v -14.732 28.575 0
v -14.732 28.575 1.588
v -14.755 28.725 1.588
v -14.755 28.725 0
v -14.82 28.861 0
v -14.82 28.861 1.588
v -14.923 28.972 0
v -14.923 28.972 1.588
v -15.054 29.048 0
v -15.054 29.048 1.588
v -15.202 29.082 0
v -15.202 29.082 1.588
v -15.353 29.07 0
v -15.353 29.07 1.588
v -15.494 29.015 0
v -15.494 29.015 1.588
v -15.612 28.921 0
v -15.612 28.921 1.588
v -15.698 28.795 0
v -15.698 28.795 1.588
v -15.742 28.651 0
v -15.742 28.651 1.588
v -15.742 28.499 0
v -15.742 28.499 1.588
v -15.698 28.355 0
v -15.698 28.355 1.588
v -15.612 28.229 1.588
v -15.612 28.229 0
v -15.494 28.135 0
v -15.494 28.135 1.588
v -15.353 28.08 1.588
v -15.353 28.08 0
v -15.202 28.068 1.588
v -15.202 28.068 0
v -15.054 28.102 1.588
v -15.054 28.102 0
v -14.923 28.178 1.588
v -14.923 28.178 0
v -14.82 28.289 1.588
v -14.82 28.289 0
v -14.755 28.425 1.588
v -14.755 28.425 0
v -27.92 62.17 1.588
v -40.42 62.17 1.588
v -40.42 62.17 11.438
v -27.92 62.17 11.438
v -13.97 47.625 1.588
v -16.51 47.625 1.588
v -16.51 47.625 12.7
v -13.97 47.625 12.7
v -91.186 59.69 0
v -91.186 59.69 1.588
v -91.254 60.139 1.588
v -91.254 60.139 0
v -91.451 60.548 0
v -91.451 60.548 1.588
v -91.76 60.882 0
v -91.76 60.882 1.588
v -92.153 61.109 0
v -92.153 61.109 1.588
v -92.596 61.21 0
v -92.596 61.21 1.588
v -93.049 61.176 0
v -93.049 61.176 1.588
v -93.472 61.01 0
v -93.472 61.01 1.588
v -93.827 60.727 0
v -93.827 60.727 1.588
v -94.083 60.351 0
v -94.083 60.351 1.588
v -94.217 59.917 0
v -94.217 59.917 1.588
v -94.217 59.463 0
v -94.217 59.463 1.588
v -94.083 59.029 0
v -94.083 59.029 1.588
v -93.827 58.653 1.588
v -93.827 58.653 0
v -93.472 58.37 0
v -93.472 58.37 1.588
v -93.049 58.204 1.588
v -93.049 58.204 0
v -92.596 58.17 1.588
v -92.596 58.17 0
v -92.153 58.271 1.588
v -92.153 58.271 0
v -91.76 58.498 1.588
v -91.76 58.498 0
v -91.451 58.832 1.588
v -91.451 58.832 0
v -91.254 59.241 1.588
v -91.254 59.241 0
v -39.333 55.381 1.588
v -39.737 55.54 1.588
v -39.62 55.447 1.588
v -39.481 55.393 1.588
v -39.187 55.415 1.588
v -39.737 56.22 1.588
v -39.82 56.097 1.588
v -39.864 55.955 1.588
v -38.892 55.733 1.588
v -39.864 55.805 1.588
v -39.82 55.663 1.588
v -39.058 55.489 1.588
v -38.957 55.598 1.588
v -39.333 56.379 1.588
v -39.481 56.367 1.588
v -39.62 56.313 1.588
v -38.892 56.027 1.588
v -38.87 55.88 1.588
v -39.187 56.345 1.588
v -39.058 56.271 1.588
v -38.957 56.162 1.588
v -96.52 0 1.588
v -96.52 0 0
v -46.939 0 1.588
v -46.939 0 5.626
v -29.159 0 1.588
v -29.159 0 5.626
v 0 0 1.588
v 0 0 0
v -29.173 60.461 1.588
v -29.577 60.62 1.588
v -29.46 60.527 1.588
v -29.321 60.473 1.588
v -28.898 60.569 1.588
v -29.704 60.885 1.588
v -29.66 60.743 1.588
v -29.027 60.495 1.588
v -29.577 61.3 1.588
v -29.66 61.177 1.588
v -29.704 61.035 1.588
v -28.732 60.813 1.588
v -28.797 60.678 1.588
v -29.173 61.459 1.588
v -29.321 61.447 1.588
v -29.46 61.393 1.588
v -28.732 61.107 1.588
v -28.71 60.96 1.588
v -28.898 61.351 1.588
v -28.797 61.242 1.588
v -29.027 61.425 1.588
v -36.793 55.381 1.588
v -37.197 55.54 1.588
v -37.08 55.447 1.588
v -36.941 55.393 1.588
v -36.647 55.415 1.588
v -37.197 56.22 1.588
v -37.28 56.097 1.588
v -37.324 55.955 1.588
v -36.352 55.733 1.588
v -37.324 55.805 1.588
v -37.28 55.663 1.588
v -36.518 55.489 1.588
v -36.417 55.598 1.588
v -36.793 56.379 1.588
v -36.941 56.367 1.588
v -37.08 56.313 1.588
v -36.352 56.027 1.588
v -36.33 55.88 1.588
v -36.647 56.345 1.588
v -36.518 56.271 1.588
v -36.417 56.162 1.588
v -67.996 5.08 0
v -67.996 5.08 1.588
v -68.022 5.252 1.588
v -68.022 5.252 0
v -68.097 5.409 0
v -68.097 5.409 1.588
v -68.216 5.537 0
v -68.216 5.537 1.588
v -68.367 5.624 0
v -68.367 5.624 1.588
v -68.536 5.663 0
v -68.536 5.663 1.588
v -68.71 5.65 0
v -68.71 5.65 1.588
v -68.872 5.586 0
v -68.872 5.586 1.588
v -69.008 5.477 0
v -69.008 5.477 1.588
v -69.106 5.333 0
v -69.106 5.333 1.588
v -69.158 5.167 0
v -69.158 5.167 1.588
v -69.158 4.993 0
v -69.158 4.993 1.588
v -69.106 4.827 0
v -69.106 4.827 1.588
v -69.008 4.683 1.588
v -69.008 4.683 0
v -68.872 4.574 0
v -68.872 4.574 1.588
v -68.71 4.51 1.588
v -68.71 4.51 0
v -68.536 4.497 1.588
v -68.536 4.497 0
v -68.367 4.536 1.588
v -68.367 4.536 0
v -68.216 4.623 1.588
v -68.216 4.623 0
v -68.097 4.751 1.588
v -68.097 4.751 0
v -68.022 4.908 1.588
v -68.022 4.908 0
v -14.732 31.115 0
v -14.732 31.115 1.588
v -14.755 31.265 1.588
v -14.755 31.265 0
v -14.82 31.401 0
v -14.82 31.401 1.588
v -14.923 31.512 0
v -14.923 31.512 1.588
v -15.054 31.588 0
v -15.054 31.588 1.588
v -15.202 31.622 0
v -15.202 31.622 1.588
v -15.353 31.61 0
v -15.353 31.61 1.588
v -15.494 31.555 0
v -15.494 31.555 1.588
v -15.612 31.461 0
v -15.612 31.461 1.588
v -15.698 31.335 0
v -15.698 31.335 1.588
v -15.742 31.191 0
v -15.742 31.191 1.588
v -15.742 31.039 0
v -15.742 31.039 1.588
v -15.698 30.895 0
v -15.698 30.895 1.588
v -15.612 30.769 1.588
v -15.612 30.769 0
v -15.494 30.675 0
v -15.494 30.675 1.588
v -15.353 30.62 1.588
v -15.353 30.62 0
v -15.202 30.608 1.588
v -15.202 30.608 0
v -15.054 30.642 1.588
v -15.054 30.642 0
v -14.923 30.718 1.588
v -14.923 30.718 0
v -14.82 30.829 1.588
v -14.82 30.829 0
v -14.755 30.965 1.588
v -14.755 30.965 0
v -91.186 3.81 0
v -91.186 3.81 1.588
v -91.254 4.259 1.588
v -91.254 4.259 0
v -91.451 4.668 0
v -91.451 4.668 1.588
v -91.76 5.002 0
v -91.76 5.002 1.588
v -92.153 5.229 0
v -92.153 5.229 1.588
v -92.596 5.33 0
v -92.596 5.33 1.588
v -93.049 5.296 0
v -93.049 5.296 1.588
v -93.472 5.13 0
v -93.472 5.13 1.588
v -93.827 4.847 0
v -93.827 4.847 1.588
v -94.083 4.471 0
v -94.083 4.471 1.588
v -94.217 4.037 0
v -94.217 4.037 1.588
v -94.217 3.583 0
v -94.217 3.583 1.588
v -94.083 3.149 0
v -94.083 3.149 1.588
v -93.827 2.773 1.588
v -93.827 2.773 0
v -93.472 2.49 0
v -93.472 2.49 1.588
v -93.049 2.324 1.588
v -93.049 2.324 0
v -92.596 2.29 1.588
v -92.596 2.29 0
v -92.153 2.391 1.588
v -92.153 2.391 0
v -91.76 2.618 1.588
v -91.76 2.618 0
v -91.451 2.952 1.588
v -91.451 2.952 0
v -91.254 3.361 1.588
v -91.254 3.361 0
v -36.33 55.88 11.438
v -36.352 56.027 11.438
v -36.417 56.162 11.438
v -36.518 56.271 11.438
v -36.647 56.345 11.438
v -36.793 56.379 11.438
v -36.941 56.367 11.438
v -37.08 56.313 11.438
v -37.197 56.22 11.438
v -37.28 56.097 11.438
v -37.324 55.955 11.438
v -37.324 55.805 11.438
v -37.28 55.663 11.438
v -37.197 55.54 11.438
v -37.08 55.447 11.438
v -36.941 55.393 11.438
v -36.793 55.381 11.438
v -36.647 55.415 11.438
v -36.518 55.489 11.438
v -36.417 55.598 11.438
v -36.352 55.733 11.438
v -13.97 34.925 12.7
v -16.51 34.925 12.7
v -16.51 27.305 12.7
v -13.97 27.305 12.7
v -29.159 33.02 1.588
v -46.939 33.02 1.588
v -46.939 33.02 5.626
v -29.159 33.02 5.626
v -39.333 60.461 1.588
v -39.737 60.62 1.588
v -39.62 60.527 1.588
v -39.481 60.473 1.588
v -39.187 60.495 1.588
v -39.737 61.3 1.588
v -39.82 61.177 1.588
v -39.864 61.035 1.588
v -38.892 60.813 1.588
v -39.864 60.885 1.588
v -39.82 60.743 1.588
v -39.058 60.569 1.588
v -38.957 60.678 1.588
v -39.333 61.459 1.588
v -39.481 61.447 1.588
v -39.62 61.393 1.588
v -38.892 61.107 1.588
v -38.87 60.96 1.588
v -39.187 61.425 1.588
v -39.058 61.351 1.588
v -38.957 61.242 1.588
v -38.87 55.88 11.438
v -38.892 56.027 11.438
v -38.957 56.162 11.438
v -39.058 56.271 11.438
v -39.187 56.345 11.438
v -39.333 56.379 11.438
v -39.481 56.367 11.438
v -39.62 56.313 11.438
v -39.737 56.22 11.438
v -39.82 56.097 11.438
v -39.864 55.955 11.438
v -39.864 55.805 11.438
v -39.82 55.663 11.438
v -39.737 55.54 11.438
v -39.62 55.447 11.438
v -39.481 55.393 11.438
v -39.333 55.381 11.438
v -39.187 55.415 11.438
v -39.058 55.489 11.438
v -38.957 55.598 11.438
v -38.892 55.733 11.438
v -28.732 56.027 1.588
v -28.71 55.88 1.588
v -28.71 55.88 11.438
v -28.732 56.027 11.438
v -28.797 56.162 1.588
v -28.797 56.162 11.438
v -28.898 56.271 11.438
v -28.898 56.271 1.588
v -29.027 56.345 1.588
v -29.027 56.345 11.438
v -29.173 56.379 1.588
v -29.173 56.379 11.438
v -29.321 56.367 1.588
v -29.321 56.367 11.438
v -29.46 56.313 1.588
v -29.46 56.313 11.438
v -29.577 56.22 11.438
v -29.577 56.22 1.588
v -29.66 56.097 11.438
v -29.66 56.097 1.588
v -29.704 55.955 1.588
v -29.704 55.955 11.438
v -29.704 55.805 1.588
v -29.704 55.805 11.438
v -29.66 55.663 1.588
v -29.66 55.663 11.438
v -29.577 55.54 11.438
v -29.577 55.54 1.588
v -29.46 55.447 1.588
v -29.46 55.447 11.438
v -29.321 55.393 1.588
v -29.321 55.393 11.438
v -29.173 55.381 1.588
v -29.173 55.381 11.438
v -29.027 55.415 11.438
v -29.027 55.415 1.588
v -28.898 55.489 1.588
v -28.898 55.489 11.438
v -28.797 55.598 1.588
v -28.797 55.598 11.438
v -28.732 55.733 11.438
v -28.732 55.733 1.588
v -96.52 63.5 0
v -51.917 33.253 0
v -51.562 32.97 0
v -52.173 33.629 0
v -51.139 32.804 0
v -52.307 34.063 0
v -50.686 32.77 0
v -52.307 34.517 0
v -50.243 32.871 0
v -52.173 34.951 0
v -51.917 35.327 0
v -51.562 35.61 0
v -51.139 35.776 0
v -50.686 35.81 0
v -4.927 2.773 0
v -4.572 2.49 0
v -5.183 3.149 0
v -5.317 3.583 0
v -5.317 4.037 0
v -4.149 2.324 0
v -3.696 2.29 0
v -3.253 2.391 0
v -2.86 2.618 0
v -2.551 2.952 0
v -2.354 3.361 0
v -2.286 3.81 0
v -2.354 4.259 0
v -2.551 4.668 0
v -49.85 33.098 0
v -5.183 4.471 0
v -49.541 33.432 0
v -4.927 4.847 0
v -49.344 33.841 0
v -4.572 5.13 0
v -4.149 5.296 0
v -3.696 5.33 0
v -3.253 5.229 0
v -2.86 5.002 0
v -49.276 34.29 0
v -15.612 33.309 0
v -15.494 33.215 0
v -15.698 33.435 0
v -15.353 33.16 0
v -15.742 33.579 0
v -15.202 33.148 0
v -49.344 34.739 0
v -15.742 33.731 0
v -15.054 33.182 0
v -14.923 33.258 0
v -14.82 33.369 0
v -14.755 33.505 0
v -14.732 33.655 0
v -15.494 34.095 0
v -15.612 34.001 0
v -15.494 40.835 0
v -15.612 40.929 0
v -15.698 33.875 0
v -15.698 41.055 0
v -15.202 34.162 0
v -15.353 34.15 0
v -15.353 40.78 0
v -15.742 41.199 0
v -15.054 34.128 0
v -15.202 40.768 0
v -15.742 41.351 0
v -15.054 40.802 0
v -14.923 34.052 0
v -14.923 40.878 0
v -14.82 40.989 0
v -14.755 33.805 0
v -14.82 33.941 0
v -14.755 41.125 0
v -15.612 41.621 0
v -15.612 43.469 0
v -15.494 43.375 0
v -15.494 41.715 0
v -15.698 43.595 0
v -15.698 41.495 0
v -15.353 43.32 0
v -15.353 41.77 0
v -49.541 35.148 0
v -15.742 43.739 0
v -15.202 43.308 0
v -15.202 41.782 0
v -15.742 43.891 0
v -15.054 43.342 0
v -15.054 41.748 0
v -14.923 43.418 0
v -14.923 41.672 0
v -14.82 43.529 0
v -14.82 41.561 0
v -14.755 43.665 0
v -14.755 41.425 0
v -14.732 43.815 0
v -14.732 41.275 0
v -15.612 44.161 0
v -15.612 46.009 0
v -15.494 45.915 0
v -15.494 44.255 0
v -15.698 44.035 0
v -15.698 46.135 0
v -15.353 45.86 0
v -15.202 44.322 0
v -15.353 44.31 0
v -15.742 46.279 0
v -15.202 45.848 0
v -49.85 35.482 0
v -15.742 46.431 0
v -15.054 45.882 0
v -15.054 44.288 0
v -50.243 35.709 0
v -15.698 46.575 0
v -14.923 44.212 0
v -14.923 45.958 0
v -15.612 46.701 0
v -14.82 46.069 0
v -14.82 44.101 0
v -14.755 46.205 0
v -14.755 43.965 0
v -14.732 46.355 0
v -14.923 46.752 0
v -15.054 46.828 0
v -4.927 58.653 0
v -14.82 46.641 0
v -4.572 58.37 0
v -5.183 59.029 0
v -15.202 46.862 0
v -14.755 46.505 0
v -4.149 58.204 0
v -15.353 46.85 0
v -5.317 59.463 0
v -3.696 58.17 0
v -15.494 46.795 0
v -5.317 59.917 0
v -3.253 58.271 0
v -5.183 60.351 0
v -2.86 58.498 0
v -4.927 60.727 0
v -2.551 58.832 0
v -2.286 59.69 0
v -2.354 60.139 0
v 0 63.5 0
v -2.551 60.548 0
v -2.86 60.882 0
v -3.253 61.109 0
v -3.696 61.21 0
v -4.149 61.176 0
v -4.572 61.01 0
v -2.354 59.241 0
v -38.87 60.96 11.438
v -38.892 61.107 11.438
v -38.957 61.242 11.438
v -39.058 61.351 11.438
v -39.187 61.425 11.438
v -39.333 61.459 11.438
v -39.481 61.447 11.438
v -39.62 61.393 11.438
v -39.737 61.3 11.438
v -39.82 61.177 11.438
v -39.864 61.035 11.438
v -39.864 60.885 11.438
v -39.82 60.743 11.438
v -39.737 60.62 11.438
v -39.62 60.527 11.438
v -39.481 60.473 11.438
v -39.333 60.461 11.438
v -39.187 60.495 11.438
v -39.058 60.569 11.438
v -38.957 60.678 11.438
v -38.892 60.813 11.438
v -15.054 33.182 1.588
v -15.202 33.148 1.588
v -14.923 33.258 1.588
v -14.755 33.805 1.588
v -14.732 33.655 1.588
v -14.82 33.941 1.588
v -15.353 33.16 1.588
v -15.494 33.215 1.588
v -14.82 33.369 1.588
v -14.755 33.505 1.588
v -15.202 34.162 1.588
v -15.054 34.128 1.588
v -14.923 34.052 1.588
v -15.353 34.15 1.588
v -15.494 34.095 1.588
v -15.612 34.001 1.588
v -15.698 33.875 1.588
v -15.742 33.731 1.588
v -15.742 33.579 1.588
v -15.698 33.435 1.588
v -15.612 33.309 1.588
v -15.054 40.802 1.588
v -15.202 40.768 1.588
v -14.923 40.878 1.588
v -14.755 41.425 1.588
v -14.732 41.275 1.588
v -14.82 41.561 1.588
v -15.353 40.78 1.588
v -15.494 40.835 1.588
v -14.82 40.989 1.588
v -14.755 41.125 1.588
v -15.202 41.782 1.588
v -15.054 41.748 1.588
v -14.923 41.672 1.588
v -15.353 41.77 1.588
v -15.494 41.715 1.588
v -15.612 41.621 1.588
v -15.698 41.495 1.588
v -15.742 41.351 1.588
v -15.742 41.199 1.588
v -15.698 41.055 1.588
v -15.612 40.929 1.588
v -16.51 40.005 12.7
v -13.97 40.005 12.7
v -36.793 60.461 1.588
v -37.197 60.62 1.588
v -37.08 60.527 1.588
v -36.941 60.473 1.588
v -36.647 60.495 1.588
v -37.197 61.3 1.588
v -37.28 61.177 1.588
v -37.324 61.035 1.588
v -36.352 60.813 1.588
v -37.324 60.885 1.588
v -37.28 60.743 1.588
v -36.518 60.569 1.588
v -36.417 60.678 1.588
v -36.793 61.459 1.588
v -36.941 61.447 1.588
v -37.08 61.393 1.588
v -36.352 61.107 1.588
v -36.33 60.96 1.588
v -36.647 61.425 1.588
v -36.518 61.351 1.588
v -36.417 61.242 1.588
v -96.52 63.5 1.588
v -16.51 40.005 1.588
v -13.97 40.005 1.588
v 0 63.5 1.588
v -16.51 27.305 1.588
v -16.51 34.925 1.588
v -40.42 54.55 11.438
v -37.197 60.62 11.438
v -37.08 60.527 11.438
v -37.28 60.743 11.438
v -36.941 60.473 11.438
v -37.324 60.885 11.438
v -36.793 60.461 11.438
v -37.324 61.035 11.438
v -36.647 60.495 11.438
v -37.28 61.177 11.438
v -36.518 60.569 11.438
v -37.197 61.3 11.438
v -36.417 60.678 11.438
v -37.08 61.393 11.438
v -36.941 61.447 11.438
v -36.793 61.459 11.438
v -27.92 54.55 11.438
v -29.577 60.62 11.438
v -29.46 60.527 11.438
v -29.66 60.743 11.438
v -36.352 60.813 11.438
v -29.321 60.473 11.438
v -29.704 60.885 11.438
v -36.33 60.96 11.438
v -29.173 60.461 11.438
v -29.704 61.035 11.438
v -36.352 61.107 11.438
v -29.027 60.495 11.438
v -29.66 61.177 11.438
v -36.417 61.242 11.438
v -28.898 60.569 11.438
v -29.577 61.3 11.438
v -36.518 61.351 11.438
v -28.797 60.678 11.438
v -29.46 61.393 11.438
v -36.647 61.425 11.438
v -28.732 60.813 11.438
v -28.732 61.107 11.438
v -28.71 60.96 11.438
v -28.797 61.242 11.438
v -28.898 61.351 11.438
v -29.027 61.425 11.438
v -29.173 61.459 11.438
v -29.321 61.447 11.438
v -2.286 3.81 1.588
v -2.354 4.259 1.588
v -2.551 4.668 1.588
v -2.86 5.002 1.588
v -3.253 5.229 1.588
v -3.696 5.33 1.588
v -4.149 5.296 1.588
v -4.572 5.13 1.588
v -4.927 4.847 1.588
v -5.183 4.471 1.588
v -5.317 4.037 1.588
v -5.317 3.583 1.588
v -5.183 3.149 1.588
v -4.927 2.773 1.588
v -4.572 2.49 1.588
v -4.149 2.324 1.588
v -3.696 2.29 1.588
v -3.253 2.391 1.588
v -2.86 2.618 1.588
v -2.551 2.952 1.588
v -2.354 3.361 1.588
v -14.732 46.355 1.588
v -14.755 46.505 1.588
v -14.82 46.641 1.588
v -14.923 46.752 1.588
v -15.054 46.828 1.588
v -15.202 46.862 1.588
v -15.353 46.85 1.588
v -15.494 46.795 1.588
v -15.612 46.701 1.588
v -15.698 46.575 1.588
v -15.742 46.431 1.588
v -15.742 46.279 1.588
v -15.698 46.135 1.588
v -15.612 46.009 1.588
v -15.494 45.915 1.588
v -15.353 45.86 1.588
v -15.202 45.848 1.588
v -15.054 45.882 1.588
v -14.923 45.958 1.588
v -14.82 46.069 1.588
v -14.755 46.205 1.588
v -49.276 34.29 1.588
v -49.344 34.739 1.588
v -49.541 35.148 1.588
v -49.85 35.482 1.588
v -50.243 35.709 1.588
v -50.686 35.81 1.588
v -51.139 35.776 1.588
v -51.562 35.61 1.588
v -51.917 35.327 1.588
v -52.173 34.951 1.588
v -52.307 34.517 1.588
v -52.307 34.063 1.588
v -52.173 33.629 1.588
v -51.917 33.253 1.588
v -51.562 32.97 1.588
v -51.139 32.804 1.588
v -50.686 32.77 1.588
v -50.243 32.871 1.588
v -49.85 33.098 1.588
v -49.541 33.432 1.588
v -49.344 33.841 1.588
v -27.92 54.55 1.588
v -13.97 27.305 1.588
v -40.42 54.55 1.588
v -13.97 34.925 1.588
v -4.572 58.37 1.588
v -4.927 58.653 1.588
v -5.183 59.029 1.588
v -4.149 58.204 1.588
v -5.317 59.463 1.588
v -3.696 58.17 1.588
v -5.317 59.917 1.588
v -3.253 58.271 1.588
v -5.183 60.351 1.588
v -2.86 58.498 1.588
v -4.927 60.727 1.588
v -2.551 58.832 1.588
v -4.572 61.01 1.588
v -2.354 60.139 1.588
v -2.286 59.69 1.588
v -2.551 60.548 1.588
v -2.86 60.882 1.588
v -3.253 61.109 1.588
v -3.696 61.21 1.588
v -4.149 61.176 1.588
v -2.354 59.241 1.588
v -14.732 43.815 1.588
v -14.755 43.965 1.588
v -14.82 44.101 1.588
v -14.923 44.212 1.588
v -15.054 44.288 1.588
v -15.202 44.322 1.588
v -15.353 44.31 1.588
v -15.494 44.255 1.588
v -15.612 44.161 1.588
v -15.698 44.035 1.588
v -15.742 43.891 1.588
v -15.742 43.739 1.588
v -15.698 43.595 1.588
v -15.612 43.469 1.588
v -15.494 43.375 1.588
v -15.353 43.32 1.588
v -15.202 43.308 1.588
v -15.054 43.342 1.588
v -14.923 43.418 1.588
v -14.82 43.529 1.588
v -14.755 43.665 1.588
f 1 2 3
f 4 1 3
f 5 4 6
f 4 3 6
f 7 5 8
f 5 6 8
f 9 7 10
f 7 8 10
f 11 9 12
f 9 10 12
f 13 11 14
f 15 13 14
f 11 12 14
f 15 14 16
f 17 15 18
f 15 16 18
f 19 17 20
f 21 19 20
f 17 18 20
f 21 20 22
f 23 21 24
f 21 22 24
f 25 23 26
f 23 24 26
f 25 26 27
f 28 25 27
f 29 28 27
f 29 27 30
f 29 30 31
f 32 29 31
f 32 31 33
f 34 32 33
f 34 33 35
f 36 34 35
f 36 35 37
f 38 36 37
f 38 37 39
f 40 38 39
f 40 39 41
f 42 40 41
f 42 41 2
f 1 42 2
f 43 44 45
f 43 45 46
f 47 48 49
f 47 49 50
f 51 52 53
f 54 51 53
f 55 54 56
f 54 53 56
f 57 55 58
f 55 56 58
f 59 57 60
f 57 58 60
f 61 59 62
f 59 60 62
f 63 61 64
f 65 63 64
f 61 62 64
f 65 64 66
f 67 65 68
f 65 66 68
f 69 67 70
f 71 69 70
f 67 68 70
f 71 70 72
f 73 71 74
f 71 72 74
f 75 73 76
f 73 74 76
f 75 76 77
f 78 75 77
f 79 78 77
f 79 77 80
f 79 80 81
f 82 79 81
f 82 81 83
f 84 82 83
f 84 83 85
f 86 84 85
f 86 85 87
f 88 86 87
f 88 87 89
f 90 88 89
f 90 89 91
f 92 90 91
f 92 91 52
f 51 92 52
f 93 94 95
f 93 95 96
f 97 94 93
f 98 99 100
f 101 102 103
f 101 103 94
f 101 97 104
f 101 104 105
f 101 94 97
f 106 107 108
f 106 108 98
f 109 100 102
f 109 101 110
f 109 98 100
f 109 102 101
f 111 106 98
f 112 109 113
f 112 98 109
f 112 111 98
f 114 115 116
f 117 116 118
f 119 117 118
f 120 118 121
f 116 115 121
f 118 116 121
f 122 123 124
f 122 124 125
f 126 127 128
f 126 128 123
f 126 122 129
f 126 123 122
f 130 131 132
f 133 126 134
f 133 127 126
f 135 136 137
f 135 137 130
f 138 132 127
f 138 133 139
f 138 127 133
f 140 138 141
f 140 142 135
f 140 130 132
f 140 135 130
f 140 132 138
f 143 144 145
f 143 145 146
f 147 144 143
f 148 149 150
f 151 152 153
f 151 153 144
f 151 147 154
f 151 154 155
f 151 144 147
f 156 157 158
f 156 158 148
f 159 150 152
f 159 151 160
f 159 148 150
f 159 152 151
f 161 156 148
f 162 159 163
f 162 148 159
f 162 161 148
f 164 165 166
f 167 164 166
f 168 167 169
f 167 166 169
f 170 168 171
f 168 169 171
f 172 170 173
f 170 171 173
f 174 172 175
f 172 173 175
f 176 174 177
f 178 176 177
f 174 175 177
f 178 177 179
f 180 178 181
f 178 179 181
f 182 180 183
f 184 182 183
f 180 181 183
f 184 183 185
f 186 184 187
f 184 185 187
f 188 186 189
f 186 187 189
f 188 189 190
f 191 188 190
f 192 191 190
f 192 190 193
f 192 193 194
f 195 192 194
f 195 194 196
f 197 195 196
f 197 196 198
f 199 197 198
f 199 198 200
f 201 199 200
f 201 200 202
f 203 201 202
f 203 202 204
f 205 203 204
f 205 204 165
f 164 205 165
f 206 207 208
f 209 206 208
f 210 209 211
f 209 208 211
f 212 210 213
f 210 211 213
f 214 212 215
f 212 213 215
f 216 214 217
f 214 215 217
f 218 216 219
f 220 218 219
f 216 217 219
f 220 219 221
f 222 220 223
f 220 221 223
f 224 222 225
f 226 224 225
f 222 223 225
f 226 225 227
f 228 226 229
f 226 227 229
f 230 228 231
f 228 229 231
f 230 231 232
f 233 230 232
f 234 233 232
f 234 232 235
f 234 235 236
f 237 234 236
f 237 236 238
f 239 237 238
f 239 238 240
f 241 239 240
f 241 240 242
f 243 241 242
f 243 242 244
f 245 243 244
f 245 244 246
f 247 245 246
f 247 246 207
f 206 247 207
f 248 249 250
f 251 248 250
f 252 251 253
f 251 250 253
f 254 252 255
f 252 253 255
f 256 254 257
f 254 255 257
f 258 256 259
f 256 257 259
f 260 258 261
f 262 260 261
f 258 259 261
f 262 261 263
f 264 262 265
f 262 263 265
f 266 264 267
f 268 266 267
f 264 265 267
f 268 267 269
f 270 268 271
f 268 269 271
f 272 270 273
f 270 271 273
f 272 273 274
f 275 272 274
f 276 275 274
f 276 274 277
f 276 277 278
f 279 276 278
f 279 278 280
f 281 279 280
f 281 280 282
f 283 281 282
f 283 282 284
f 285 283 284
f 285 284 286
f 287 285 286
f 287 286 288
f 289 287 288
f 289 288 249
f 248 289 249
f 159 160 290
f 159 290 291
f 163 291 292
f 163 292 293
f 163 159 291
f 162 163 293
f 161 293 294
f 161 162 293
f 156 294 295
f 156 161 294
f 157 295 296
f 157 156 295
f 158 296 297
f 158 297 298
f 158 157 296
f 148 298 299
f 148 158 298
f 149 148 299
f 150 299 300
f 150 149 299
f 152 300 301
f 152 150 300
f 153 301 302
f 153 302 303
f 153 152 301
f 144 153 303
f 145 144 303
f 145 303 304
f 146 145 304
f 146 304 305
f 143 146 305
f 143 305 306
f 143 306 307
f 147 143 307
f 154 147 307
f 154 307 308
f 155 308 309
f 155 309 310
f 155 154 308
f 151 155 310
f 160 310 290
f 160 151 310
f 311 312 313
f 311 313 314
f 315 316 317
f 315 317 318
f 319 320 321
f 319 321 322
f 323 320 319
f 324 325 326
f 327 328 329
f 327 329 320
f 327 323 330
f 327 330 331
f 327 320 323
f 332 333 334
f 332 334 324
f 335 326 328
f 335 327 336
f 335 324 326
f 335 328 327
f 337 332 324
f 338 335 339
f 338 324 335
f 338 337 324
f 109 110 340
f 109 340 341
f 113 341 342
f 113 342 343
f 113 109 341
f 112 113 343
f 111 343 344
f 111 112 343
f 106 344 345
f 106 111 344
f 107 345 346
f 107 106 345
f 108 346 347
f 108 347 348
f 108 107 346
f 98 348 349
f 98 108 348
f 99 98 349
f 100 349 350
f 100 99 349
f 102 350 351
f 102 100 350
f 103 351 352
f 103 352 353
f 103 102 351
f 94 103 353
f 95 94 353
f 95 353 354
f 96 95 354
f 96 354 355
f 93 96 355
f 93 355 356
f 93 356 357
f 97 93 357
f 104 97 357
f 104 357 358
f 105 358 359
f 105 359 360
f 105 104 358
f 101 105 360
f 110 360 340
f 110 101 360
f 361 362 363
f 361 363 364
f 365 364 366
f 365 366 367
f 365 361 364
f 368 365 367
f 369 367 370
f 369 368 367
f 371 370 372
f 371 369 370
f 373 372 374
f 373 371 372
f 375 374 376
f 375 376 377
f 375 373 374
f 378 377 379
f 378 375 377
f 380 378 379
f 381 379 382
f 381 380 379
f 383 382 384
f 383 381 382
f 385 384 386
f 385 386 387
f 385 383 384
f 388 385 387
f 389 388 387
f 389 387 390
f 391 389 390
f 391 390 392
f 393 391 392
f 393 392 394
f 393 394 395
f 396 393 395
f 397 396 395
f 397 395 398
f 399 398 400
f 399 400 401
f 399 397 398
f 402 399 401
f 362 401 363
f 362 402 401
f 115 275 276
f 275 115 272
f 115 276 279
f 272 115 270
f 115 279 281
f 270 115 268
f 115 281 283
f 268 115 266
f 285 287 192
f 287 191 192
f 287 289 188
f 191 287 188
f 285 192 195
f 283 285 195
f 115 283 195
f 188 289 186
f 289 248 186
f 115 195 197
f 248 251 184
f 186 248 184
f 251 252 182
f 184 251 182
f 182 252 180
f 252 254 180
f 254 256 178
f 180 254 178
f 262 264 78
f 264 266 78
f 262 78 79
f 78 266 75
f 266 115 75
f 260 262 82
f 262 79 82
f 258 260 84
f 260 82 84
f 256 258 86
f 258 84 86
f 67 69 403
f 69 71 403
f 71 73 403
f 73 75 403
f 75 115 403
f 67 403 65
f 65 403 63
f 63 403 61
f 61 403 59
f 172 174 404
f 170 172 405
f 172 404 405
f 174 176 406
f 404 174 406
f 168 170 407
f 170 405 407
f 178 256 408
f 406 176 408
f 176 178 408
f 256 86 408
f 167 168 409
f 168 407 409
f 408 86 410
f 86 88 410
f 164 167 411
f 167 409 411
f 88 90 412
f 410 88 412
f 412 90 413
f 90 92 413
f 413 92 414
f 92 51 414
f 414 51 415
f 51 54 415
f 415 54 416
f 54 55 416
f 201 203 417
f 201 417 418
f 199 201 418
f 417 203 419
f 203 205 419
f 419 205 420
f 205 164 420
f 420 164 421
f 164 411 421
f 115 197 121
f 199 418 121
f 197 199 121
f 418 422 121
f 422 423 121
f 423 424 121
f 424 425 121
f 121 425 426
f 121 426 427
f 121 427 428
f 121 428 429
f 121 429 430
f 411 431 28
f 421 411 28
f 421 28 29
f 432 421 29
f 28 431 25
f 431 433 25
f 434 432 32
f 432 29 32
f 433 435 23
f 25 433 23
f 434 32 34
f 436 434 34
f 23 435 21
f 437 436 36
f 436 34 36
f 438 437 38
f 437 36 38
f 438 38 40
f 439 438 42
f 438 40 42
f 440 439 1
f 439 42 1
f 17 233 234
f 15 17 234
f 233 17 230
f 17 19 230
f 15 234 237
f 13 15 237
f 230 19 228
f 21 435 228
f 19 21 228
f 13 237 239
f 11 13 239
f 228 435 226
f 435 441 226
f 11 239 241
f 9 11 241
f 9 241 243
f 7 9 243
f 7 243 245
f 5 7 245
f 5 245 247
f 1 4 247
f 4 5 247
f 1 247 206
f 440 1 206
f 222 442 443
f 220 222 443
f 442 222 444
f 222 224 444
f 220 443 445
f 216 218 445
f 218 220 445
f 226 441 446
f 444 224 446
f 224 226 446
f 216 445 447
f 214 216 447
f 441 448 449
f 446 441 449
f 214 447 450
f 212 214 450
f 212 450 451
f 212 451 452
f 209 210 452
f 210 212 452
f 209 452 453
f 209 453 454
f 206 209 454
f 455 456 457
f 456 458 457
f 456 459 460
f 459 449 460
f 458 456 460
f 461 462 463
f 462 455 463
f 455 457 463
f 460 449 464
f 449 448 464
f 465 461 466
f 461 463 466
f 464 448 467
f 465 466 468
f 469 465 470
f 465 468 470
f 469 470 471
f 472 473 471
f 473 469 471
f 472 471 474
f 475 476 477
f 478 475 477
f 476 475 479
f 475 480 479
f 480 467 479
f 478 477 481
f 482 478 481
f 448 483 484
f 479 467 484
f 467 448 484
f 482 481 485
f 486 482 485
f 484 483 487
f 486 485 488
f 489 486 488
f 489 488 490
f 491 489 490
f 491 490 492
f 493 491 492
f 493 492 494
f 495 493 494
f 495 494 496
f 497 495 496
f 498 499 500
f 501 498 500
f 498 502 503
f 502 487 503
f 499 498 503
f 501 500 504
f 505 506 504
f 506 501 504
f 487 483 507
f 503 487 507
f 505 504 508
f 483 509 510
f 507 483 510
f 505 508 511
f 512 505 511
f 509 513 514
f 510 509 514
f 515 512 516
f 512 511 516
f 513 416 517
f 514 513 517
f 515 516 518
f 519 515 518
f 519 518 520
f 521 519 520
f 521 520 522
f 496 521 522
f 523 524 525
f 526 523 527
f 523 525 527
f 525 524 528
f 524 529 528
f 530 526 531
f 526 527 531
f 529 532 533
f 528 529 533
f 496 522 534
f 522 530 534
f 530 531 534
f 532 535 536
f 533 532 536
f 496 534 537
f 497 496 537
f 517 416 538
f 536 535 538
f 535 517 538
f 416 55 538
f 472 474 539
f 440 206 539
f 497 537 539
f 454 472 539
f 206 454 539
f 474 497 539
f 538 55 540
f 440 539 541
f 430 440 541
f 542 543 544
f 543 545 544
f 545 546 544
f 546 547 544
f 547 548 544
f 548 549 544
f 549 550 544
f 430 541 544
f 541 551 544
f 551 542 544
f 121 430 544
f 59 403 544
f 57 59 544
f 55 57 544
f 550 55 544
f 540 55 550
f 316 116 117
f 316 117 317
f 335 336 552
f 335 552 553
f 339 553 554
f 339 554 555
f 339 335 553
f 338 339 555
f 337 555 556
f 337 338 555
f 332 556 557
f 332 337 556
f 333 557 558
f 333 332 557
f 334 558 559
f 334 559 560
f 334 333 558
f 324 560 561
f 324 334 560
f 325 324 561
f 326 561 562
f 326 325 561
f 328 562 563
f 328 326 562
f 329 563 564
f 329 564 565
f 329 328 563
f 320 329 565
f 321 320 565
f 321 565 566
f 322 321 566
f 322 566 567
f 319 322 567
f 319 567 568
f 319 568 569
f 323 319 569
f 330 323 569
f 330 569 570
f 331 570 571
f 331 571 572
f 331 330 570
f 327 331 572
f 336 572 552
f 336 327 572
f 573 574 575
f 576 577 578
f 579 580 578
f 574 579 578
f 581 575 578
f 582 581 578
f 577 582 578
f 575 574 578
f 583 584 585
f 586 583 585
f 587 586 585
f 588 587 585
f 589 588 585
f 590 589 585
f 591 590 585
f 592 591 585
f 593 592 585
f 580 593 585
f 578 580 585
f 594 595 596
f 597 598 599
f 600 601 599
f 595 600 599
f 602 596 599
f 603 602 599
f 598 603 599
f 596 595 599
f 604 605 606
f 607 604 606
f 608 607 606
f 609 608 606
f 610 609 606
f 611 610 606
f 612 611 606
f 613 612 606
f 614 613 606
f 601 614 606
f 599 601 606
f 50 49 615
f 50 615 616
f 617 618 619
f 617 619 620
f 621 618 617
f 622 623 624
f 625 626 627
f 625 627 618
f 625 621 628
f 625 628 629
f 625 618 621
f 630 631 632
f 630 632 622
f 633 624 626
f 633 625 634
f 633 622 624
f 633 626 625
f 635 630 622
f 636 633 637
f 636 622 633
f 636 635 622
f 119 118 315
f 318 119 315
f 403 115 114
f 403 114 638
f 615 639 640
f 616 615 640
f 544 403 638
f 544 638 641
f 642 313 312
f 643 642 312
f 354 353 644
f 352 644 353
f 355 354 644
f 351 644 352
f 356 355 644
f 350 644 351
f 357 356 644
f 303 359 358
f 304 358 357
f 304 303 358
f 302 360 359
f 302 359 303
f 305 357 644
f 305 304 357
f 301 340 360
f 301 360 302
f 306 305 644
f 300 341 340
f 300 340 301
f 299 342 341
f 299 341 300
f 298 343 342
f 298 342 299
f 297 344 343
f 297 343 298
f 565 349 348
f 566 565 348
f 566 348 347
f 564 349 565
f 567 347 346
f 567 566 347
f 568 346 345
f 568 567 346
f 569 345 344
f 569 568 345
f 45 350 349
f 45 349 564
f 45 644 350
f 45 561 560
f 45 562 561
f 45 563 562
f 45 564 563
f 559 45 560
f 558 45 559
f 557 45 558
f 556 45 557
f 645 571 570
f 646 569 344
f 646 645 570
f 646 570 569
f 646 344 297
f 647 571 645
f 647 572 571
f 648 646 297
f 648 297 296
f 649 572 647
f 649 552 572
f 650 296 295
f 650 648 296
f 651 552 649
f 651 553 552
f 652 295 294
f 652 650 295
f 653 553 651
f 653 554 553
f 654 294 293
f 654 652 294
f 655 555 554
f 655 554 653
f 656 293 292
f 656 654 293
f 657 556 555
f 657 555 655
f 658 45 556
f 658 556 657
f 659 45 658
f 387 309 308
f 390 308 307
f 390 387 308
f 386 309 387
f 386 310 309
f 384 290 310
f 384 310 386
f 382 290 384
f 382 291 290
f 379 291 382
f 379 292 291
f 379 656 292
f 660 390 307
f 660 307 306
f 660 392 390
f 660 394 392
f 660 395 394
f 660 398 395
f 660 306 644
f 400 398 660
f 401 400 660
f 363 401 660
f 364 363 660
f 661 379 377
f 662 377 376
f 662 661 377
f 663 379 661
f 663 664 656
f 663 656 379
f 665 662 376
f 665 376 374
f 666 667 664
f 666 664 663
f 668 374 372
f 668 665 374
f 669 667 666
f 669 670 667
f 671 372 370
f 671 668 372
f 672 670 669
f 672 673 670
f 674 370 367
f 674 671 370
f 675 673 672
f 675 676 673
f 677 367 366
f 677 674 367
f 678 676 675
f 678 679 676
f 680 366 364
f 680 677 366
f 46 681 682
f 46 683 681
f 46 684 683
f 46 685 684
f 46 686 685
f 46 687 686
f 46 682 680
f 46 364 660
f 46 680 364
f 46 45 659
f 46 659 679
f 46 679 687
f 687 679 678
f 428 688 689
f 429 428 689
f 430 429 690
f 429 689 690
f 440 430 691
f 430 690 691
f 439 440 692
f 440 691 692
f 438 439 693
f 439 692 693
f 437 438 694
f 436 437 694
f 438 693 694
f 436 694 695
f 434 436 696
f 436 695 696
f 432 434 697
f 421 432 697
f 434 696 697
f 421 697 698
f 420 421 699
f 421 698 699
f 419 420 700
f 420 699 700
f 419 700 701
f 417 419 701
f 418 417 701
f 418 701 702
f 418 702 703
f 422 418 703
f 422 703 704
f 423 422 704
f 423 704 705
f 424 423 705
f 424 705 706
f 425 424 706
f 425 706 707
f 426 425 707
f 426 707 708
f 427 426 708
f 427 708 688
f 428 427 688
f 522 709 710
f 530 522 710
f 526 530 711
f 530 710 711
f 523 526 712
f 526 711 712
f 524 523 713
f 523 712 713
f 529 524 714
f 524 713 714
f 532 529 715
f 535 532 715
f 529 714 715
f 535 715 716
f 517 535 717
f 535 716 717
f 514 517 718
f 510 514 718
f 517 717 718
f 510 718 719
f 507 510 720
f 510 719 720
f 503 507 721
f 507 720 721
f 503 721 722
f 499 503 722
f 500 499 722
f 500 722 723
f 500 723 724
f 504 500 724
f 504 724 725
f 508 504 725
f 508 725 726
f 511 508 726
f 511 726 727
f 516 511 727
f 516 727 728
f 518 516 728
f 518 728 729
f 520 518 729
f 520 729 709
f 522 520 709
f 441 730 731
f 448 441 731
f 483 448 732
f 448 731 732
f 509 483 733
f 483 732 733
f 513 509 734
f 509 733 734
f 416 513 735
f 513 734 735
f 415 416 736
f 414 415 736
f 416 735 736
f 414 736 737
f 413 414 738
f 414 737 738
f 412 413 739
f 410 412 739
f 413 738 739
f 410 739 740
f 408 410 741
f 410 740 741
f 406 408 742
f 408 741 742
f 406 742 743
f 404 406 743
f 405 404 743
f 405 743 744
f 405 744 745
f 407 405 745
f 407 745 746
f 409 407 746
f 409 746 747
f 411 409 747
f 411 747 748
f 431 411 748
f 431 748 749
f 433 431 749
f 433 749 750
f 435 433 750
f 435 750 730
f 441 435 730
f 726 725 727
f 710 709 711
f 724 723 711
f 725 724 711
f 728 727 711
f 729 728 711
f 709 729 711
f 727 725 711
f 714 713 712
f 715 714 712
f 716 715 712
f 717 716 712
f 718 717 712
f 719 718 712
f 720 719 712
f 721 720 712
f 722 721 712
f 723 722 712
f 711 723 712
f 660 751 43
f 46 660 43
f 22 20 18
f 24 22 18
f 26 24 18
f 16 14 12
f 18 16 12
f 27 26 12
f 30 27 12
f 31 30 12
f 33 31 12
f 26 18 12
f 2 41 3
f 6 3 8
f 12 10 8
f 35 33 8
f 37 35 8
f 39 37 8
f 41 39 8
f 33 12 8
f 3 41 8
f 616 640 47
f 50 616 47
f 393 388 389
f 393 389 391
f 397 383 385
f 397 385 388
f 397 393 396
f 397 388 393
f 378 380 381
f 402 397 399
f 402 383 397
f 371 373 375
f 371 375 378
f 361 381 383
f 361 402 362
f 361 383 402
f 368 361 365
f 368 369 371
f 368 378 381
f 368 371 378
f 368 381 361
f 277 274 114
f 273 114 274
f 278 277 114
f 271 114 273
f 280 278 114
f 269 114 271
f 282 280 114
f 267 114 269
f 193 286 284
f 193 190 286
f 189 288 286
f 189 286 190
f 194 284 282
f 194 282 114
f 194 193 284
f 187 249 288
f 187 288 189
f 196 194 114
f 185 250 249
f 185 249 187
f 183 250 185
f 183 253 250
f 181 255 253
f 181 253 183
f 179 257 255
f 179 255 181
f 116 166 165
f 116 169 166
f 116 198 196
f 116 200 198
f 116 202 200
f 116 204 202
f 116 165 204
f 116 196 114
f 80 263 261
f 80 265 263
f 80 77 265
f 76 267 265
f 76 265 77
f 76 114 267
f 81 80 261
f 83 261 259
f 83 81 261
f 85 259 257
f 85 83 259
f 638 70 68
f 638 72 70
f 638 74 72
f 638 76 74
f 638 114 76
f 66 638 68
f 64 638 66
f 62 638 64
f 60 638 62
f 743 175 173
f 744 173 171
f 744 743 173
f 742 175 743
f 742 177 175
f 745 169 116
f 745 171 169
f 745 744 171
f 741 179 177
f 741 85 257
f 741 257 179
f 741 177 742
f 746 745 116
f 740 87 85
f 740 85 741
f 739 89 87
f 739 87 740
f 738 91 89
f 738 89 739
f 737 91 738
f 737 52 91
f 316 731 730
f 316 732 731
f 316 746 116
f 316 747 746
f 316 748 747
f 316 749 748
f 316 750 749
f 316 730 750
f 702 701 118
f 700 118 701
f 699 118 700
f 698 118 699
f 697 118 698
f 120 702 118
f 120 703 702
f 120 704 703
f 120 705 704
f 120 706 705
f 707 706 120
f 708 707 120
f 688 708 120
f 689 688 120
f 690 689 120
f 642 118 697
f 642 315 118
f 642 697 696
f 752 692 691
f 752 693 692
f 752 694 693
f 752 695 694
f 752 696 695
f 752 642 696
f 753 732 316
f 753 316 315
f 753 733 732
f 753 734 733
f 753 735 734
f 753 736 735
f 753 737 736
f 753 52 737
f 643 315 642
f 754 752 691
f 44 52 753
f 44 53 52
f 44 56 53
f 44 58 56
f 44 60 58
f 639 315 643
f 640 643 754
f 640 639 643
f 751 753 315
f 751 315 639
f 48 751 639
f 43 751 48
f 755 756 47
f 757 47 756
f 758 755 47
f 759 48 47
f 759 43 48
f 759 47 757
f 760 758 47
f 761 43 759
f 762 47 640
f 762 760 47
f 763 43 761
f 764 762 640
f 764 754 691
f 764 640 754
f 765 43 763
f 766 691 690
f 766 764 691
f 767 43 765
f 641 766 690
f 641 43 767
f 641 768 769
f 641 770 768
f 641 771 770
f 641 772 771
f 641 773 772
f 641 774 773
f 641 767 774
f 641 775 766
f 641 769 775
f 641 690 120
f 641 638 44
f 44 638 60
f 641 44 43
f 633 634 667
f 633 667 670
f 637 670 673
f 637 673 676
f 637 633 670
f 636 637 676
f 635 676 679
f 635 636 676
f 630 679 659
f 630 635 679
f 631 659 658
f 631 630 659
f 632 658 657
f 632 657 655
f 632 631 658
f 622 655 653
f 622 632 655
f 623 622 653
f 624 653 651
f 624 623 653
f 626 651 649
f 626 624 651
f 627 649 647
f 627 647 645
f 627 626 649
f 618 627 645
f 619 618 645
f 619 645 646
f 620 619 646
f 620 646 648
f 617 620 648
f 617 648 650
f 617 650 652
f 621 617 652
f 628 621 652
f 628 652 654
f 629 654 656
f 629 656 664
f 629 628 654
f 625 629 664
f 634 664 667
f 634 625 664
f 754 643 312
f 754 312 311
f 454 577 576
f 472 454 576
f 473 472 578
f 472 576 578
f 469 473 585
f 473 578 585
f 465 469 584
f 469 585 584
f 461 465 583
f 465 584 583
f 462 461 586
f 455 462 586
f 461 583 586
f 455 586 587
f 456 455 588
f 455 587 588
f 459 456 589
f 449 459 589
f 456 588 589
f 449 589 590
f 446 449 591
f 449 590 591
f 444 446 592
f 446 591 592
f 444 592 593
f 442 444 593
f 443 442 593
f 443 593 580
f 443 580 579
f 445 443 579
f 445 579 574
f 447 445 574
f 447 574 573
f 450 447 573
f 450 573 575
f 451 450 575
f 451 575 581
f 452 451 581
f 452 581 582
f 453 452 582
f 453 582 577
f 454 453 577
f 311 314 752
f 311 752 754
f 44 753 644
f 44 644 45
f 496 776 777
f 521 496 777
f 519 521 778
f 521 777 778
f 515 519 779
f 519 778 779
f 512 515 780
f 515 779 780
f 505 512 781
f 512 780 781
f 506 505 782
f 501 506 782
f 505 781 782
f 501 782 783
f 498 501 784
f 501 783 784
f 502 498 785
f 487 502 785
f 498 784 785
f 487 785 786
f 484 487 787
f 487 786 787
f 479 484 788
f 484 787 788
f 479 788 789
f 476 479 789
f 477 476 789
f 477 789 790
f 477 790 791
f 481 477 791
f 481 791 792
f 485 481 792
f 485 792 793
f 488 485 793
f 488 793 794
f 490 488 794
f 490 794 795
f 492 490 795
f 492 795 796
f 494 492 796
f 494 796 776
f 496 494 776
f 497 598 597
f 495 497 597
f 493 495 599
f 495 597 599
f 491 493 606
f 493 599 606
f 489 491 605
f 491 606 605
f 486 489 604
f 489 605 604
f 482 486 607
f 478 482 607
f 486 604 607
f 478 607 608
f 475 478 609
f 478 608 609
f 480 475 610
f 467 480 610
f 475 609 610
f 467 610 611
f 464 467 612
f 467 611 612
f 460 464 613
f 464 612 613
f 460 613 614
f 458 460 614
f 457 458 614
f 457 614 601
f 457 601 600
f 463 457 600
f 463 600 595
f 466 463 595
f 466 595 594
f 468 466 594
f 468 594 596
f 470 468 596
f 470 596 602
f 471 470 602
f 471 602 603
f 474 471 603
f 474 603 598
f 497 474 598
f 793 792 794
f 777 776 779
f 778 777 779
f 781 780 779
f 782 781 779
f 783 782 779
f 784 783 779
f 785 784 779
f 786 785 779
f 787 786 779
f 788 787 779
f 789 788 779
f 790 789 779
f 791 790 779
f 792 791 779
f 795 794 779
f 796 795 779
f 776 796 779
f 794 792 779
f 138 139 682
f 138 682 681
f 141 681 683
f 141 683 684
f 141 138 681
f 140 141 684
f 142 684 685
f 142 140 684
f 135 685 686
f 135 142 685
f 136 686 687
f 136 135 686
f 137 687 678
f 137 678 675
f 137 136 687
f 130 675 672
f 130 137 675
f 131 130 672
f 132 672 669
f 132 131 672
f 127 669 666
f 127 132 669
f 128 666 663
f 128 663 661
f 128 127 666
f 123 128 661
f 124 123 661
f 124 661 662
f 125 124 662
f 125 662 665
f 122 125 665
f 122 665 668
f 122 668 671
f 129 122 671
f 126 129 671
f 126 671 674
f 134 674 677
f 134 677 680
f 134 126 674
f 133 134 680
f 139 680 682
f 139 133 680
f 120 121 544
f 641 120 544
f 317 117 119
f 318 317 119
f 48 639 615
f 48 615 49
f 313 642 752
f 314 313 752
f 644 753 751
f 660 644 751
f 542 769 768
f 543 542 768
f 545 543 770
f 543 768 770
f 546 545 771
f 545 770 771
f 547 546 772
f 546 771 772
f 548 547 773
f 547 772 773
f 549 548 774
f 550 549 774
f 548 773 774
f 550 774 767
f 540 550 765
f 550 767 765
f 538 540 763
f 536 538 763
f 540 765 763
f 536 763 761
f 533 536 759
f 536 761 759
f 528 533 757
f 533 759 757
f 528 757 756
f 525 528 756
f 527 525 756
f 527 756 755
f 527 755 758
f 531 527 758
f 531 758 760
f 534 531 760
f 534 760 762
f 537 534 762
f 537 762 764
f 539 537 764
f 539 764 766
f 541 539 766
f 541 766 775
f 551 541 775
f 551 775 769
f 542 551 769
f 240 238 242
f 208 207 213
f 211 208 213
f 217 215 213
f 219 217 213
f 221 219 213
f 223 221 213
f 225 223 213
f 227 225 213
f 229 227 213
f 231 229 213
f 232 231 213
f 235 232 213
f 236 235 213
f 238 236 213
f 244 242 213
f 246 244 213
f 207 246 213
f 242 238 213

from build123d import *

# Parameters (mm, degrees)
SKETCH1_W            = 96.52
SKETCH1_H            = 63.5
BOSS_EXTRUDE1_DEPTH  = 1.5875
SKETCH2_R            = 0.5842
SKETCH2_R_2          = 1.524
SKETCH2_R_3          = 0.508
HOLES_DEPTH          = 116.54601056
SKETCH3_W            = 17.78
SKETCH3_H            = 33.02
PRO_MICRO_DEPTH      = 4.0386
SKETCH4_R            = 1.524
MOUNTING_HOLES_DEPTH = 116.605668935
SKETCH5_W            = 12.5
SKETCH5_H            = 7.62
SKETCH5_R            = 0.5
DC_RELAY_DEPTH       = 9.85
SKETCH6_W            = 2.54
SKETCH6_H            = 7.62
BOSS_EXTRUDE2_DEPTH  = 11.1125


with BuildPart() as part:
    # Sketch1 → Boss-Extrude1 (new body)
    with BuildSketch(Plane.XY):
        with Locations((-48.26, 31.75)):
            Rectangle(SKETCH1_W, SKETCH1_H)
    extrude(amount=BOSS_EXTRUDE1_DEPTH)

    # Sketch2 → Holes (cut, through all)
    with BuildSketch(Plane.XY.offset(1.5875)):
        with Locations((-68.58, 5.08)):
            Circle(SKETCH2_R)
        with Locations((-50.8, 34.29)):
            Circle(SKETCH2_R_2)
        with Locations((-15.24, 46.355)):
            Circle(SKETCH2_R_3)
        with Locations((-15.24, 43.815)):
            Circle(SKETCH2_R_3)
        with Locations((-15.24, 41.275)):
            Circle(SKETCH2_R_3)
        with Locations((-15.24, 33.655)):
            Circle(SKETCH2_R_3)
        with Locations((-15.24, 31.115)):
            Circle(SKETCH2_R_3)
        with Locations((-15.24, 28.575)):
            Circle(SKETCH2_R_3)
    extrude(amount=-HOLES_DEPTH, mode=Mode.SUBTRACT)

    # Sketch3 → pro micro (add)
    with BuildSketch(Plane.XY.offset(1.5875)):
        with Locations((-38.0492, 16.51)):
            Rectangle(SKETCH3_W, SKETCH3_H)
    extrude(amount=PRO_MICRO_DEPTH)

    # Sketch4 → mounting holes (cut, through all)
    with BuildSketch(Plane.XY.offset(1.5875)):
        with Locations((-92.71, 3.81)):
            Circle(SKETCH4_R)
        with Locations((-92.71, 59.69)):
            Circle(SKETCH4_R)
        with Locations((-3.81, 59.69)):
            Circle(SKETCH4_R)
        with Locations((-3.81, 3.81)):
            Circle(SKETCH4_R)
    extrude(amount=-MOUNTING_HOLES_DEPTH, mode=Mode.SUBTRACT)

    # Sketch5 → DC relay (add)
    with BuildSketch(Plane.XY.offset(1.5875)):
        with Locations((-34.17, 58.36)):
            Rectangle(SKETCH5_W, SKETCH5_H)
        with Locations((-39.37, 60.96)):
            Circle(SKETCH5_R, mode=Mode.SUBTRACT)
        with Locations((-39.37, 55.88)):
            Circle(SKETCH5_R, mode=Mode.SUBTRACT)
        with Locations((-36.83, 60.96)):
            Circle(SKETCH5_R, mode=Mode.SUBTRACT)
        with Locations((-29.21, 60.96)):
            Circle(SKETCH5_R, mode=Mode.SUBTRACT)
        with Locations((-36.83, 55.88)):
            Circle(SKETCH5_R, mode=Mode.SUBTRACT)
        with Locations((-29.21, 55.88)):
            Circle(SKETCH5_R, mode=Mode.SUBTRACT)
    extrude(amount=DC_RELAY_DEPTH)

    # Sketch6 → Boss-Extrude2 (add)
    with BuildSketch(Plane.XY.offset(1.5875)):
        with Locations((-15.24, 43.815)):
            Rectangle(SKETCH6_W, SKETCH6_H)
        with Locations((-15.24, 31.115)):
            Rectangle(SKETCH6_W, SKETCH6_H)
    extrude(amount=BOSS_EXTRUDE2_DEPTH)


solid = part.part
